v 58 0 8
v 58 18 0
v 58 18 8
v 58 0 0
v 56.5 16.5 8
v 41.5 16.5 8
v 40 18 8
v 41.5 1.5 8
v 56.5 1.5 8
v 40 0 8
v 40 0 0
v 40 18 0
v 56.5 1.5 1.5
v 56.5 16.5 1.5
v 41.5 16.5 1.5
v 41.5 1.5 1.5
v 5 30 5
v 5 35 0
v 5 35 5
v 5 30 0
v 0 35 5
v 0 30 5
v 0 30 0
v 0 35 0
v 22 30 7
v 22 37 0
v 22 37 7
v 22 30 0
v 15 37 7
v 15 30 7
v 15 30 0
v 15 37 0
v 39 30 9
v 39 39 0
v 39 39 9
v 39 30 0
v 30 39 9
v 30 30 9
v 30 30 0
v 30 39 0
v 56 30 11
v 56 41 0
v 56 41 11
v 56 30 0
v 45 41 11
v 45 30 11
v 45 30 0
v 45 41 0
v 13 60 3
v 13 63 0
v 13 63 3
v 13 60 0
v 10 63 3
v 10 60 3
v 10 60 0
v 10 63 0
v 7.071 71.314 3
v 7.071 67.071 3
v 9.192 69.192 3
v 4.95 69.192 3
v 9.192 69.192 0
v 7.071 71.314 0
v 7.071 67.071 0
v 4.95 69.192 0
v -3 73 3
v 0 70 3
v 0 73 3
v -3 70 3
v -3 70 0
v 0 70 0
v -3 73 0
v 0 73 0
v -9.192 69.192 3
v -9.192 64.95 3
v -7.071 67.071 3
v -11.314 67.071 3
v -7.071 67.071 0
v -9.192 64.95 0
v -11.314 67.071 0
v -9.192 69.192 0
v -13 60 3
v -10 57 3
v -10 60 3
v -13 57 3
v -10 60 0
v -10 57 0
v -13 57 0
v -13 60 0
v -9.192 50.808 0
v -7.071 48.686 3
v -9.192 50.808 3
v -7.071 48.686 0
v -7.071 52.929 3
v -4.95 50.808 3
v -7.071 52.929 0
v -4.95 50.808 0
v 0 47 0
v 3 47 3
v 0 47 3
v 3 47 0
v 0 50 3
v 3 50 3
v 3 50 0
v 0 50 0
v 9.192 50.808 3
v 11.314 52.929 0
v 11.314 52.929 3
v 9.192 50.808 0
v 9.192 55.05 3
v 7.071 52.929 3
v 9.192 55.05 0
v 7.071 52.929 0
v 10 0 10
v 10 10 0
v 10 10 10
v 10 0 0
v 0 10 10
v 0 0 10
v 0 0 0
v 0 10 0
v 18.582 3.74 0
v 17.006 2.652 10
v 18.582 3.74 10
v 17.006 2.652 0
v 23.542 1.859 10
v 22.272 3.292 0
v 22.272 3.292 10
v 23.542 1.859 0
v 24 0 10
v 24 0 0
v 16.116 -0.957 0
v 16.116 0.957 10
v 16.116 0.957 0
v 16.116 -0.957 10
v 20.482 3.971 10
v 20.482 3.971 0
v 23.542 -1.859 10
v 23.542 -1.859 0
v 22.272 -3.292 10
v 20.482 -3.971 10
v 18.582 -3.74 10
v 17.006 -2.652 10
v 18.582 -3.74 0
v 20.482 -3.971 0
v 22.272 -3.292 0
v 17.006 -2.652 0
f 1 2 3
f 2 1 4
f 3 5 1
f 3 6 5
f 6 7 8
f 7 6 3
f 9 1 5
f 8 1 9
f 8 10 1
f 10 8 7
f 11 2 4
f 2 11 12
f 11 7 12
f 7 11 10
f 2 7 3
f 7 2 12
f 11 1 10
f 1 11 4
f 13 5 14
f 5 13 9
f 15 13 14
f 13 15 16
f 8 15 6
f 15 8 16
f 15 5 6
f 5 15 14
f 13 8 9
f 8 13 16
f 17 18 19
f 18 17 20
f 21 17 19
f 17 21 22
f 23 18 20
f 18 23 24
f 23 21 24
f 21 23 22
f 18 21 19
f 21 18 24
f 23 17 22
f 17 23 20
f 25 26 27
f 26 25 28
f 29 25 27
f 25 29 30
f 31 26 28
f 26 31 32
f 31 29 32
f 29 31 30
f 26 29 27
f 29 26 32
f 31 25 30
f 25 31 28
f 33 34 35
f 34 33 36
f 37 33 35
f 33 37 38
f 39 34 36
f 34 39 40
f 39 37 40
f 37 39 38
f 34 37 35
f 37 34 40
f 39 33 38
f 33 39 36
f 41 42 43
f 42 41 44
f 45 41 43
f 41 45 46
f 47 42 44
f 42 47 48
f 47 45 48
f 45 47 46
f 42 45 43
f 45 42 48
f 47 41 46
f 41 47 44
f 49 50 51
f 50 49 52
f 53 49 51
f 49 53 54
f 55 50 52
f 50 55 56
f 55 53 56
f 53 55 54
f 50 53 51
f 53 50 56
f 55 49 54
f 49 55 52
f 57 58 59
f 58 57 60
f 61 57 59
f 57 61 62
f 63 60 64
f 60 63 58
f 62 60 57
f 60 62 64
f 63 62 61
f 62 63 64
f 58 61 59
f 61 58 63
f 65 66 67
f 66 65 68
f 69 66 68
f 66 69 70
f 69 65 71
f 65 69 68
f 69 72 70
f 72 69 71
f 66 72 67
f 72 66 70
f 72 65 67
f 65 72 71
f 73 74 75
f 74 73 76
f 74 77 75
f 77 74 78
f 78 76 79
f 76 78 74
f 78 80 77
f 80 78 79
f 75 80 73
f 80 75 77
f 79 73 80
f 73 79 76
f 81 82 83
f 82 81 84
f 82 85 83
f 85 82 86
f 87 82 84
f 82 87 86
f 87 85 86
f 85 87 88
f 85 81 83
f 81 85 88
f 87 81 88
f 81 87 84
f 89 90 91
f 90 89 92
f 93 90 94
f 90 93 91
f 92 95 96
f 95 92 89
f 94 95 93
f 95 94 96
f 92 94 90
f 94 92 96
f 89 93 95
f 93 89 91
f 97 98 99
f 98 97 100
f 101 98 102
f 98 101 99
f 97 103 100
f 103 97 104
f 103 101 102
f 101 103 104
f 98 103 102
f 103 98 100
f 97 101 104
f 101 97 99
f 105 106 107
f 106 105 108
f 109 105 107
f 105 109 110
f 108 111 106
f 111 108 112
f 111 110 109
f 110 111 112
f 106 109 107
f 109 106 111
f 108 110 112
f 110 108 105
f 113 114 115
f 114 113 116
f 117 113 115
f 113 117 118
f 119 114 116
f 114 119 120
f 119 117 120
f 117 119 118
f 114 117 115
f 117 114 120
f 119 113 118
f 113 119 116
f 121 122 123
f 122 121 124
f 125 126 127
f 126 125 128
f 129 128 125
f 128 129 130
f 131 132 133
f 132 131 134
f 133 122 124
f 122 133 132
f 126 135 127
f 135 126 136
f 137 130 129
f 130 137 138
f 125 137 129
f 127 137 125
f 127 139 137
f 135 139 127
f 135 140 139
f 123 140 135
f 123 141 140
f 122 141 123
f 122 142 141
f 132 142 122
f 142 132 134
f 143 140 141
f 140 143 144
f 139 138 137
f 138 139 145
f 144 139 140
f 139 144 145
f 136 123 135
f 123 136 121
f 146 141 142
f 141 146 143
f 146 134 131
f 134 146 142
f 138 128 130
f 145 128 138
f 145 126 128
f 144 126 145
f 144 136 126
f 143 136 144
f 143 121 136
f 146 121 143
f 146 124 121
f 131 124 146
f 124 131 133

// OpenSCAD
/*
 * moicad - Advanced OpenSCAD Features Demo
 *
 * This file demonstrates all the newly implemented language features:
 * - Variables and expressions
 * - User-defined functions
 * - User-defined modules
 * - Conditional statements (if/else)
 * - All operators (arithmetic, logical, ternary)
 * - Built-in math functions
 */

// ========================================
// Variables & Expressions
// ========================================

base_size = 10;
multiplier = 1.5;
calculated_size = base_size * multiplier + 2;  // = 17

// ========================================
// Functions
// ========================================

// Simple function
function double(x) = x * 2;

// Function with multiple parameters
function calculate_volume(w, h, d) = w * h * d;

// Function using built-in math
function hypotenuse(a, b) = sqrt(pow(a, 2) + pow(b, 2));

// Function with ternary operator
function clamp(val, minimum, maximum) =
    val < minimum ? minimum : (val > maximum ? maximum : val);

// ========================================
// Modules
// ========================================

// Simple module
module rounded_cube(size, center_it) {
    // This is simplified - just a cube for now
    cube(size);
}

// Module with transformations
module positioned_sphere(x, y, z, radius) {
    translate([x, y, z])
        sphere(radius);
}

// Complex module using other operations
module hollow_box(outer_size, wall_thickness) {
    inner_size = outer_size - wall_thickness * 2;

    difference() {
        cube(outer_size);
        translate([wall_thickness, wall_thickness, wall_thickness])
            cube(inner_size);
    }
}

// Module using conditionals
module conditional_shape(use_cube, size) {
    if (use_cube) {
        cube(size);
    } else {
        sphere(size / 2);
    }
}

// ========================================
// Conditional Statements
// ========================================

enable_demo_1 = true;
enable_demo_2 = false;

if (enable_demo_1) {
    // Demo 1: Basic shapes
    translate([0, 0, 0])
        cube(10);
}

if (enable_demo_2) {
    translate([20, 0, 0])
        sphere(5);
} else {
    // This branch executes
    translate([20, 0, 0])
        cylinder(r=4, h=10);
}

// ========================================
// Operators Demo
// ========================================

// Arithmetic
a = 10 + 5;     // = 15
b = 10 - 5;     // = 5
c = 10 * 5;     // = 50
d = 10 / 5;     // = 2
e = 10 % 3;     // = 1

// Comparison
is_equal = (a == 15);          // true
is_greater = (a > 10);         // true
is_less_or_equal = (b <= 5);   // true

// Logical
both_true = is_equal && is_greater;  // true
either_true = is_equal || false;     // true
negated = !false;                     // true

// Ternary operator
size_choice = is_equal ? 20 : 10;    // 20

// ========================================
// Built-in Math Functions Demo
// ========================================

// Basic math
abs_val = abs(-5);           // 5
ceiling = ceil(4.3);         // 5
flooring = floor(4.7);       // 4
rounded = round(4.5);        // 5

// Advanced math
square_root = sqrt(16);      // 4
power = pow(2, 3);           // 8
minimum = min(5, 10, 3);     // 3
maximum = max(5, 10, 3);     // 10

// Trigonometry (degrees)
sine_30 = sin(30);           // 0.5
cosine_60 = cos(60);         // 0.5
tangent_45 = tan(45);        // 1.0

// ========================================
// Real-World Example: Parametric Keycap
// ========================================

module keycap(
    base_width,
    top_width,
    height,
    wall_thickness
) {
    // Calculate dimensions
    width_diff = base_width - top_width;
    inner_base = base_width - wall_thickness * 2;
    inner_top = top_width - wall_thickness * 2;

    difference() {
        // Outer shell
        cube([base_width, base_width, height]);

        // Hollow interior
        translate([wall_thickness, wall_thickness, wall_thickness])
            cube([inner_base, inner_base, height]);
    }
}

// Create a keycap
translate([40, 0, 0])
    keycap(
        base_width = 18,
        top_width = 12,
        height = 8,
        wall_thickness = 1.5
    );

// ========================================
// For Loop Demo
// ========================================

for (i = [0 : 3]) {
    translate([i * 15, 30, 0])
        cube(5 + i * 2);
}

// For loop with step
for (angle = [0 : 45 : 315]) {
    rotate_val = angle;
    translate([0, 60, 0])
        rotate(rotate_val)
            translate([10, 0, 0])
                cube(3);
}
